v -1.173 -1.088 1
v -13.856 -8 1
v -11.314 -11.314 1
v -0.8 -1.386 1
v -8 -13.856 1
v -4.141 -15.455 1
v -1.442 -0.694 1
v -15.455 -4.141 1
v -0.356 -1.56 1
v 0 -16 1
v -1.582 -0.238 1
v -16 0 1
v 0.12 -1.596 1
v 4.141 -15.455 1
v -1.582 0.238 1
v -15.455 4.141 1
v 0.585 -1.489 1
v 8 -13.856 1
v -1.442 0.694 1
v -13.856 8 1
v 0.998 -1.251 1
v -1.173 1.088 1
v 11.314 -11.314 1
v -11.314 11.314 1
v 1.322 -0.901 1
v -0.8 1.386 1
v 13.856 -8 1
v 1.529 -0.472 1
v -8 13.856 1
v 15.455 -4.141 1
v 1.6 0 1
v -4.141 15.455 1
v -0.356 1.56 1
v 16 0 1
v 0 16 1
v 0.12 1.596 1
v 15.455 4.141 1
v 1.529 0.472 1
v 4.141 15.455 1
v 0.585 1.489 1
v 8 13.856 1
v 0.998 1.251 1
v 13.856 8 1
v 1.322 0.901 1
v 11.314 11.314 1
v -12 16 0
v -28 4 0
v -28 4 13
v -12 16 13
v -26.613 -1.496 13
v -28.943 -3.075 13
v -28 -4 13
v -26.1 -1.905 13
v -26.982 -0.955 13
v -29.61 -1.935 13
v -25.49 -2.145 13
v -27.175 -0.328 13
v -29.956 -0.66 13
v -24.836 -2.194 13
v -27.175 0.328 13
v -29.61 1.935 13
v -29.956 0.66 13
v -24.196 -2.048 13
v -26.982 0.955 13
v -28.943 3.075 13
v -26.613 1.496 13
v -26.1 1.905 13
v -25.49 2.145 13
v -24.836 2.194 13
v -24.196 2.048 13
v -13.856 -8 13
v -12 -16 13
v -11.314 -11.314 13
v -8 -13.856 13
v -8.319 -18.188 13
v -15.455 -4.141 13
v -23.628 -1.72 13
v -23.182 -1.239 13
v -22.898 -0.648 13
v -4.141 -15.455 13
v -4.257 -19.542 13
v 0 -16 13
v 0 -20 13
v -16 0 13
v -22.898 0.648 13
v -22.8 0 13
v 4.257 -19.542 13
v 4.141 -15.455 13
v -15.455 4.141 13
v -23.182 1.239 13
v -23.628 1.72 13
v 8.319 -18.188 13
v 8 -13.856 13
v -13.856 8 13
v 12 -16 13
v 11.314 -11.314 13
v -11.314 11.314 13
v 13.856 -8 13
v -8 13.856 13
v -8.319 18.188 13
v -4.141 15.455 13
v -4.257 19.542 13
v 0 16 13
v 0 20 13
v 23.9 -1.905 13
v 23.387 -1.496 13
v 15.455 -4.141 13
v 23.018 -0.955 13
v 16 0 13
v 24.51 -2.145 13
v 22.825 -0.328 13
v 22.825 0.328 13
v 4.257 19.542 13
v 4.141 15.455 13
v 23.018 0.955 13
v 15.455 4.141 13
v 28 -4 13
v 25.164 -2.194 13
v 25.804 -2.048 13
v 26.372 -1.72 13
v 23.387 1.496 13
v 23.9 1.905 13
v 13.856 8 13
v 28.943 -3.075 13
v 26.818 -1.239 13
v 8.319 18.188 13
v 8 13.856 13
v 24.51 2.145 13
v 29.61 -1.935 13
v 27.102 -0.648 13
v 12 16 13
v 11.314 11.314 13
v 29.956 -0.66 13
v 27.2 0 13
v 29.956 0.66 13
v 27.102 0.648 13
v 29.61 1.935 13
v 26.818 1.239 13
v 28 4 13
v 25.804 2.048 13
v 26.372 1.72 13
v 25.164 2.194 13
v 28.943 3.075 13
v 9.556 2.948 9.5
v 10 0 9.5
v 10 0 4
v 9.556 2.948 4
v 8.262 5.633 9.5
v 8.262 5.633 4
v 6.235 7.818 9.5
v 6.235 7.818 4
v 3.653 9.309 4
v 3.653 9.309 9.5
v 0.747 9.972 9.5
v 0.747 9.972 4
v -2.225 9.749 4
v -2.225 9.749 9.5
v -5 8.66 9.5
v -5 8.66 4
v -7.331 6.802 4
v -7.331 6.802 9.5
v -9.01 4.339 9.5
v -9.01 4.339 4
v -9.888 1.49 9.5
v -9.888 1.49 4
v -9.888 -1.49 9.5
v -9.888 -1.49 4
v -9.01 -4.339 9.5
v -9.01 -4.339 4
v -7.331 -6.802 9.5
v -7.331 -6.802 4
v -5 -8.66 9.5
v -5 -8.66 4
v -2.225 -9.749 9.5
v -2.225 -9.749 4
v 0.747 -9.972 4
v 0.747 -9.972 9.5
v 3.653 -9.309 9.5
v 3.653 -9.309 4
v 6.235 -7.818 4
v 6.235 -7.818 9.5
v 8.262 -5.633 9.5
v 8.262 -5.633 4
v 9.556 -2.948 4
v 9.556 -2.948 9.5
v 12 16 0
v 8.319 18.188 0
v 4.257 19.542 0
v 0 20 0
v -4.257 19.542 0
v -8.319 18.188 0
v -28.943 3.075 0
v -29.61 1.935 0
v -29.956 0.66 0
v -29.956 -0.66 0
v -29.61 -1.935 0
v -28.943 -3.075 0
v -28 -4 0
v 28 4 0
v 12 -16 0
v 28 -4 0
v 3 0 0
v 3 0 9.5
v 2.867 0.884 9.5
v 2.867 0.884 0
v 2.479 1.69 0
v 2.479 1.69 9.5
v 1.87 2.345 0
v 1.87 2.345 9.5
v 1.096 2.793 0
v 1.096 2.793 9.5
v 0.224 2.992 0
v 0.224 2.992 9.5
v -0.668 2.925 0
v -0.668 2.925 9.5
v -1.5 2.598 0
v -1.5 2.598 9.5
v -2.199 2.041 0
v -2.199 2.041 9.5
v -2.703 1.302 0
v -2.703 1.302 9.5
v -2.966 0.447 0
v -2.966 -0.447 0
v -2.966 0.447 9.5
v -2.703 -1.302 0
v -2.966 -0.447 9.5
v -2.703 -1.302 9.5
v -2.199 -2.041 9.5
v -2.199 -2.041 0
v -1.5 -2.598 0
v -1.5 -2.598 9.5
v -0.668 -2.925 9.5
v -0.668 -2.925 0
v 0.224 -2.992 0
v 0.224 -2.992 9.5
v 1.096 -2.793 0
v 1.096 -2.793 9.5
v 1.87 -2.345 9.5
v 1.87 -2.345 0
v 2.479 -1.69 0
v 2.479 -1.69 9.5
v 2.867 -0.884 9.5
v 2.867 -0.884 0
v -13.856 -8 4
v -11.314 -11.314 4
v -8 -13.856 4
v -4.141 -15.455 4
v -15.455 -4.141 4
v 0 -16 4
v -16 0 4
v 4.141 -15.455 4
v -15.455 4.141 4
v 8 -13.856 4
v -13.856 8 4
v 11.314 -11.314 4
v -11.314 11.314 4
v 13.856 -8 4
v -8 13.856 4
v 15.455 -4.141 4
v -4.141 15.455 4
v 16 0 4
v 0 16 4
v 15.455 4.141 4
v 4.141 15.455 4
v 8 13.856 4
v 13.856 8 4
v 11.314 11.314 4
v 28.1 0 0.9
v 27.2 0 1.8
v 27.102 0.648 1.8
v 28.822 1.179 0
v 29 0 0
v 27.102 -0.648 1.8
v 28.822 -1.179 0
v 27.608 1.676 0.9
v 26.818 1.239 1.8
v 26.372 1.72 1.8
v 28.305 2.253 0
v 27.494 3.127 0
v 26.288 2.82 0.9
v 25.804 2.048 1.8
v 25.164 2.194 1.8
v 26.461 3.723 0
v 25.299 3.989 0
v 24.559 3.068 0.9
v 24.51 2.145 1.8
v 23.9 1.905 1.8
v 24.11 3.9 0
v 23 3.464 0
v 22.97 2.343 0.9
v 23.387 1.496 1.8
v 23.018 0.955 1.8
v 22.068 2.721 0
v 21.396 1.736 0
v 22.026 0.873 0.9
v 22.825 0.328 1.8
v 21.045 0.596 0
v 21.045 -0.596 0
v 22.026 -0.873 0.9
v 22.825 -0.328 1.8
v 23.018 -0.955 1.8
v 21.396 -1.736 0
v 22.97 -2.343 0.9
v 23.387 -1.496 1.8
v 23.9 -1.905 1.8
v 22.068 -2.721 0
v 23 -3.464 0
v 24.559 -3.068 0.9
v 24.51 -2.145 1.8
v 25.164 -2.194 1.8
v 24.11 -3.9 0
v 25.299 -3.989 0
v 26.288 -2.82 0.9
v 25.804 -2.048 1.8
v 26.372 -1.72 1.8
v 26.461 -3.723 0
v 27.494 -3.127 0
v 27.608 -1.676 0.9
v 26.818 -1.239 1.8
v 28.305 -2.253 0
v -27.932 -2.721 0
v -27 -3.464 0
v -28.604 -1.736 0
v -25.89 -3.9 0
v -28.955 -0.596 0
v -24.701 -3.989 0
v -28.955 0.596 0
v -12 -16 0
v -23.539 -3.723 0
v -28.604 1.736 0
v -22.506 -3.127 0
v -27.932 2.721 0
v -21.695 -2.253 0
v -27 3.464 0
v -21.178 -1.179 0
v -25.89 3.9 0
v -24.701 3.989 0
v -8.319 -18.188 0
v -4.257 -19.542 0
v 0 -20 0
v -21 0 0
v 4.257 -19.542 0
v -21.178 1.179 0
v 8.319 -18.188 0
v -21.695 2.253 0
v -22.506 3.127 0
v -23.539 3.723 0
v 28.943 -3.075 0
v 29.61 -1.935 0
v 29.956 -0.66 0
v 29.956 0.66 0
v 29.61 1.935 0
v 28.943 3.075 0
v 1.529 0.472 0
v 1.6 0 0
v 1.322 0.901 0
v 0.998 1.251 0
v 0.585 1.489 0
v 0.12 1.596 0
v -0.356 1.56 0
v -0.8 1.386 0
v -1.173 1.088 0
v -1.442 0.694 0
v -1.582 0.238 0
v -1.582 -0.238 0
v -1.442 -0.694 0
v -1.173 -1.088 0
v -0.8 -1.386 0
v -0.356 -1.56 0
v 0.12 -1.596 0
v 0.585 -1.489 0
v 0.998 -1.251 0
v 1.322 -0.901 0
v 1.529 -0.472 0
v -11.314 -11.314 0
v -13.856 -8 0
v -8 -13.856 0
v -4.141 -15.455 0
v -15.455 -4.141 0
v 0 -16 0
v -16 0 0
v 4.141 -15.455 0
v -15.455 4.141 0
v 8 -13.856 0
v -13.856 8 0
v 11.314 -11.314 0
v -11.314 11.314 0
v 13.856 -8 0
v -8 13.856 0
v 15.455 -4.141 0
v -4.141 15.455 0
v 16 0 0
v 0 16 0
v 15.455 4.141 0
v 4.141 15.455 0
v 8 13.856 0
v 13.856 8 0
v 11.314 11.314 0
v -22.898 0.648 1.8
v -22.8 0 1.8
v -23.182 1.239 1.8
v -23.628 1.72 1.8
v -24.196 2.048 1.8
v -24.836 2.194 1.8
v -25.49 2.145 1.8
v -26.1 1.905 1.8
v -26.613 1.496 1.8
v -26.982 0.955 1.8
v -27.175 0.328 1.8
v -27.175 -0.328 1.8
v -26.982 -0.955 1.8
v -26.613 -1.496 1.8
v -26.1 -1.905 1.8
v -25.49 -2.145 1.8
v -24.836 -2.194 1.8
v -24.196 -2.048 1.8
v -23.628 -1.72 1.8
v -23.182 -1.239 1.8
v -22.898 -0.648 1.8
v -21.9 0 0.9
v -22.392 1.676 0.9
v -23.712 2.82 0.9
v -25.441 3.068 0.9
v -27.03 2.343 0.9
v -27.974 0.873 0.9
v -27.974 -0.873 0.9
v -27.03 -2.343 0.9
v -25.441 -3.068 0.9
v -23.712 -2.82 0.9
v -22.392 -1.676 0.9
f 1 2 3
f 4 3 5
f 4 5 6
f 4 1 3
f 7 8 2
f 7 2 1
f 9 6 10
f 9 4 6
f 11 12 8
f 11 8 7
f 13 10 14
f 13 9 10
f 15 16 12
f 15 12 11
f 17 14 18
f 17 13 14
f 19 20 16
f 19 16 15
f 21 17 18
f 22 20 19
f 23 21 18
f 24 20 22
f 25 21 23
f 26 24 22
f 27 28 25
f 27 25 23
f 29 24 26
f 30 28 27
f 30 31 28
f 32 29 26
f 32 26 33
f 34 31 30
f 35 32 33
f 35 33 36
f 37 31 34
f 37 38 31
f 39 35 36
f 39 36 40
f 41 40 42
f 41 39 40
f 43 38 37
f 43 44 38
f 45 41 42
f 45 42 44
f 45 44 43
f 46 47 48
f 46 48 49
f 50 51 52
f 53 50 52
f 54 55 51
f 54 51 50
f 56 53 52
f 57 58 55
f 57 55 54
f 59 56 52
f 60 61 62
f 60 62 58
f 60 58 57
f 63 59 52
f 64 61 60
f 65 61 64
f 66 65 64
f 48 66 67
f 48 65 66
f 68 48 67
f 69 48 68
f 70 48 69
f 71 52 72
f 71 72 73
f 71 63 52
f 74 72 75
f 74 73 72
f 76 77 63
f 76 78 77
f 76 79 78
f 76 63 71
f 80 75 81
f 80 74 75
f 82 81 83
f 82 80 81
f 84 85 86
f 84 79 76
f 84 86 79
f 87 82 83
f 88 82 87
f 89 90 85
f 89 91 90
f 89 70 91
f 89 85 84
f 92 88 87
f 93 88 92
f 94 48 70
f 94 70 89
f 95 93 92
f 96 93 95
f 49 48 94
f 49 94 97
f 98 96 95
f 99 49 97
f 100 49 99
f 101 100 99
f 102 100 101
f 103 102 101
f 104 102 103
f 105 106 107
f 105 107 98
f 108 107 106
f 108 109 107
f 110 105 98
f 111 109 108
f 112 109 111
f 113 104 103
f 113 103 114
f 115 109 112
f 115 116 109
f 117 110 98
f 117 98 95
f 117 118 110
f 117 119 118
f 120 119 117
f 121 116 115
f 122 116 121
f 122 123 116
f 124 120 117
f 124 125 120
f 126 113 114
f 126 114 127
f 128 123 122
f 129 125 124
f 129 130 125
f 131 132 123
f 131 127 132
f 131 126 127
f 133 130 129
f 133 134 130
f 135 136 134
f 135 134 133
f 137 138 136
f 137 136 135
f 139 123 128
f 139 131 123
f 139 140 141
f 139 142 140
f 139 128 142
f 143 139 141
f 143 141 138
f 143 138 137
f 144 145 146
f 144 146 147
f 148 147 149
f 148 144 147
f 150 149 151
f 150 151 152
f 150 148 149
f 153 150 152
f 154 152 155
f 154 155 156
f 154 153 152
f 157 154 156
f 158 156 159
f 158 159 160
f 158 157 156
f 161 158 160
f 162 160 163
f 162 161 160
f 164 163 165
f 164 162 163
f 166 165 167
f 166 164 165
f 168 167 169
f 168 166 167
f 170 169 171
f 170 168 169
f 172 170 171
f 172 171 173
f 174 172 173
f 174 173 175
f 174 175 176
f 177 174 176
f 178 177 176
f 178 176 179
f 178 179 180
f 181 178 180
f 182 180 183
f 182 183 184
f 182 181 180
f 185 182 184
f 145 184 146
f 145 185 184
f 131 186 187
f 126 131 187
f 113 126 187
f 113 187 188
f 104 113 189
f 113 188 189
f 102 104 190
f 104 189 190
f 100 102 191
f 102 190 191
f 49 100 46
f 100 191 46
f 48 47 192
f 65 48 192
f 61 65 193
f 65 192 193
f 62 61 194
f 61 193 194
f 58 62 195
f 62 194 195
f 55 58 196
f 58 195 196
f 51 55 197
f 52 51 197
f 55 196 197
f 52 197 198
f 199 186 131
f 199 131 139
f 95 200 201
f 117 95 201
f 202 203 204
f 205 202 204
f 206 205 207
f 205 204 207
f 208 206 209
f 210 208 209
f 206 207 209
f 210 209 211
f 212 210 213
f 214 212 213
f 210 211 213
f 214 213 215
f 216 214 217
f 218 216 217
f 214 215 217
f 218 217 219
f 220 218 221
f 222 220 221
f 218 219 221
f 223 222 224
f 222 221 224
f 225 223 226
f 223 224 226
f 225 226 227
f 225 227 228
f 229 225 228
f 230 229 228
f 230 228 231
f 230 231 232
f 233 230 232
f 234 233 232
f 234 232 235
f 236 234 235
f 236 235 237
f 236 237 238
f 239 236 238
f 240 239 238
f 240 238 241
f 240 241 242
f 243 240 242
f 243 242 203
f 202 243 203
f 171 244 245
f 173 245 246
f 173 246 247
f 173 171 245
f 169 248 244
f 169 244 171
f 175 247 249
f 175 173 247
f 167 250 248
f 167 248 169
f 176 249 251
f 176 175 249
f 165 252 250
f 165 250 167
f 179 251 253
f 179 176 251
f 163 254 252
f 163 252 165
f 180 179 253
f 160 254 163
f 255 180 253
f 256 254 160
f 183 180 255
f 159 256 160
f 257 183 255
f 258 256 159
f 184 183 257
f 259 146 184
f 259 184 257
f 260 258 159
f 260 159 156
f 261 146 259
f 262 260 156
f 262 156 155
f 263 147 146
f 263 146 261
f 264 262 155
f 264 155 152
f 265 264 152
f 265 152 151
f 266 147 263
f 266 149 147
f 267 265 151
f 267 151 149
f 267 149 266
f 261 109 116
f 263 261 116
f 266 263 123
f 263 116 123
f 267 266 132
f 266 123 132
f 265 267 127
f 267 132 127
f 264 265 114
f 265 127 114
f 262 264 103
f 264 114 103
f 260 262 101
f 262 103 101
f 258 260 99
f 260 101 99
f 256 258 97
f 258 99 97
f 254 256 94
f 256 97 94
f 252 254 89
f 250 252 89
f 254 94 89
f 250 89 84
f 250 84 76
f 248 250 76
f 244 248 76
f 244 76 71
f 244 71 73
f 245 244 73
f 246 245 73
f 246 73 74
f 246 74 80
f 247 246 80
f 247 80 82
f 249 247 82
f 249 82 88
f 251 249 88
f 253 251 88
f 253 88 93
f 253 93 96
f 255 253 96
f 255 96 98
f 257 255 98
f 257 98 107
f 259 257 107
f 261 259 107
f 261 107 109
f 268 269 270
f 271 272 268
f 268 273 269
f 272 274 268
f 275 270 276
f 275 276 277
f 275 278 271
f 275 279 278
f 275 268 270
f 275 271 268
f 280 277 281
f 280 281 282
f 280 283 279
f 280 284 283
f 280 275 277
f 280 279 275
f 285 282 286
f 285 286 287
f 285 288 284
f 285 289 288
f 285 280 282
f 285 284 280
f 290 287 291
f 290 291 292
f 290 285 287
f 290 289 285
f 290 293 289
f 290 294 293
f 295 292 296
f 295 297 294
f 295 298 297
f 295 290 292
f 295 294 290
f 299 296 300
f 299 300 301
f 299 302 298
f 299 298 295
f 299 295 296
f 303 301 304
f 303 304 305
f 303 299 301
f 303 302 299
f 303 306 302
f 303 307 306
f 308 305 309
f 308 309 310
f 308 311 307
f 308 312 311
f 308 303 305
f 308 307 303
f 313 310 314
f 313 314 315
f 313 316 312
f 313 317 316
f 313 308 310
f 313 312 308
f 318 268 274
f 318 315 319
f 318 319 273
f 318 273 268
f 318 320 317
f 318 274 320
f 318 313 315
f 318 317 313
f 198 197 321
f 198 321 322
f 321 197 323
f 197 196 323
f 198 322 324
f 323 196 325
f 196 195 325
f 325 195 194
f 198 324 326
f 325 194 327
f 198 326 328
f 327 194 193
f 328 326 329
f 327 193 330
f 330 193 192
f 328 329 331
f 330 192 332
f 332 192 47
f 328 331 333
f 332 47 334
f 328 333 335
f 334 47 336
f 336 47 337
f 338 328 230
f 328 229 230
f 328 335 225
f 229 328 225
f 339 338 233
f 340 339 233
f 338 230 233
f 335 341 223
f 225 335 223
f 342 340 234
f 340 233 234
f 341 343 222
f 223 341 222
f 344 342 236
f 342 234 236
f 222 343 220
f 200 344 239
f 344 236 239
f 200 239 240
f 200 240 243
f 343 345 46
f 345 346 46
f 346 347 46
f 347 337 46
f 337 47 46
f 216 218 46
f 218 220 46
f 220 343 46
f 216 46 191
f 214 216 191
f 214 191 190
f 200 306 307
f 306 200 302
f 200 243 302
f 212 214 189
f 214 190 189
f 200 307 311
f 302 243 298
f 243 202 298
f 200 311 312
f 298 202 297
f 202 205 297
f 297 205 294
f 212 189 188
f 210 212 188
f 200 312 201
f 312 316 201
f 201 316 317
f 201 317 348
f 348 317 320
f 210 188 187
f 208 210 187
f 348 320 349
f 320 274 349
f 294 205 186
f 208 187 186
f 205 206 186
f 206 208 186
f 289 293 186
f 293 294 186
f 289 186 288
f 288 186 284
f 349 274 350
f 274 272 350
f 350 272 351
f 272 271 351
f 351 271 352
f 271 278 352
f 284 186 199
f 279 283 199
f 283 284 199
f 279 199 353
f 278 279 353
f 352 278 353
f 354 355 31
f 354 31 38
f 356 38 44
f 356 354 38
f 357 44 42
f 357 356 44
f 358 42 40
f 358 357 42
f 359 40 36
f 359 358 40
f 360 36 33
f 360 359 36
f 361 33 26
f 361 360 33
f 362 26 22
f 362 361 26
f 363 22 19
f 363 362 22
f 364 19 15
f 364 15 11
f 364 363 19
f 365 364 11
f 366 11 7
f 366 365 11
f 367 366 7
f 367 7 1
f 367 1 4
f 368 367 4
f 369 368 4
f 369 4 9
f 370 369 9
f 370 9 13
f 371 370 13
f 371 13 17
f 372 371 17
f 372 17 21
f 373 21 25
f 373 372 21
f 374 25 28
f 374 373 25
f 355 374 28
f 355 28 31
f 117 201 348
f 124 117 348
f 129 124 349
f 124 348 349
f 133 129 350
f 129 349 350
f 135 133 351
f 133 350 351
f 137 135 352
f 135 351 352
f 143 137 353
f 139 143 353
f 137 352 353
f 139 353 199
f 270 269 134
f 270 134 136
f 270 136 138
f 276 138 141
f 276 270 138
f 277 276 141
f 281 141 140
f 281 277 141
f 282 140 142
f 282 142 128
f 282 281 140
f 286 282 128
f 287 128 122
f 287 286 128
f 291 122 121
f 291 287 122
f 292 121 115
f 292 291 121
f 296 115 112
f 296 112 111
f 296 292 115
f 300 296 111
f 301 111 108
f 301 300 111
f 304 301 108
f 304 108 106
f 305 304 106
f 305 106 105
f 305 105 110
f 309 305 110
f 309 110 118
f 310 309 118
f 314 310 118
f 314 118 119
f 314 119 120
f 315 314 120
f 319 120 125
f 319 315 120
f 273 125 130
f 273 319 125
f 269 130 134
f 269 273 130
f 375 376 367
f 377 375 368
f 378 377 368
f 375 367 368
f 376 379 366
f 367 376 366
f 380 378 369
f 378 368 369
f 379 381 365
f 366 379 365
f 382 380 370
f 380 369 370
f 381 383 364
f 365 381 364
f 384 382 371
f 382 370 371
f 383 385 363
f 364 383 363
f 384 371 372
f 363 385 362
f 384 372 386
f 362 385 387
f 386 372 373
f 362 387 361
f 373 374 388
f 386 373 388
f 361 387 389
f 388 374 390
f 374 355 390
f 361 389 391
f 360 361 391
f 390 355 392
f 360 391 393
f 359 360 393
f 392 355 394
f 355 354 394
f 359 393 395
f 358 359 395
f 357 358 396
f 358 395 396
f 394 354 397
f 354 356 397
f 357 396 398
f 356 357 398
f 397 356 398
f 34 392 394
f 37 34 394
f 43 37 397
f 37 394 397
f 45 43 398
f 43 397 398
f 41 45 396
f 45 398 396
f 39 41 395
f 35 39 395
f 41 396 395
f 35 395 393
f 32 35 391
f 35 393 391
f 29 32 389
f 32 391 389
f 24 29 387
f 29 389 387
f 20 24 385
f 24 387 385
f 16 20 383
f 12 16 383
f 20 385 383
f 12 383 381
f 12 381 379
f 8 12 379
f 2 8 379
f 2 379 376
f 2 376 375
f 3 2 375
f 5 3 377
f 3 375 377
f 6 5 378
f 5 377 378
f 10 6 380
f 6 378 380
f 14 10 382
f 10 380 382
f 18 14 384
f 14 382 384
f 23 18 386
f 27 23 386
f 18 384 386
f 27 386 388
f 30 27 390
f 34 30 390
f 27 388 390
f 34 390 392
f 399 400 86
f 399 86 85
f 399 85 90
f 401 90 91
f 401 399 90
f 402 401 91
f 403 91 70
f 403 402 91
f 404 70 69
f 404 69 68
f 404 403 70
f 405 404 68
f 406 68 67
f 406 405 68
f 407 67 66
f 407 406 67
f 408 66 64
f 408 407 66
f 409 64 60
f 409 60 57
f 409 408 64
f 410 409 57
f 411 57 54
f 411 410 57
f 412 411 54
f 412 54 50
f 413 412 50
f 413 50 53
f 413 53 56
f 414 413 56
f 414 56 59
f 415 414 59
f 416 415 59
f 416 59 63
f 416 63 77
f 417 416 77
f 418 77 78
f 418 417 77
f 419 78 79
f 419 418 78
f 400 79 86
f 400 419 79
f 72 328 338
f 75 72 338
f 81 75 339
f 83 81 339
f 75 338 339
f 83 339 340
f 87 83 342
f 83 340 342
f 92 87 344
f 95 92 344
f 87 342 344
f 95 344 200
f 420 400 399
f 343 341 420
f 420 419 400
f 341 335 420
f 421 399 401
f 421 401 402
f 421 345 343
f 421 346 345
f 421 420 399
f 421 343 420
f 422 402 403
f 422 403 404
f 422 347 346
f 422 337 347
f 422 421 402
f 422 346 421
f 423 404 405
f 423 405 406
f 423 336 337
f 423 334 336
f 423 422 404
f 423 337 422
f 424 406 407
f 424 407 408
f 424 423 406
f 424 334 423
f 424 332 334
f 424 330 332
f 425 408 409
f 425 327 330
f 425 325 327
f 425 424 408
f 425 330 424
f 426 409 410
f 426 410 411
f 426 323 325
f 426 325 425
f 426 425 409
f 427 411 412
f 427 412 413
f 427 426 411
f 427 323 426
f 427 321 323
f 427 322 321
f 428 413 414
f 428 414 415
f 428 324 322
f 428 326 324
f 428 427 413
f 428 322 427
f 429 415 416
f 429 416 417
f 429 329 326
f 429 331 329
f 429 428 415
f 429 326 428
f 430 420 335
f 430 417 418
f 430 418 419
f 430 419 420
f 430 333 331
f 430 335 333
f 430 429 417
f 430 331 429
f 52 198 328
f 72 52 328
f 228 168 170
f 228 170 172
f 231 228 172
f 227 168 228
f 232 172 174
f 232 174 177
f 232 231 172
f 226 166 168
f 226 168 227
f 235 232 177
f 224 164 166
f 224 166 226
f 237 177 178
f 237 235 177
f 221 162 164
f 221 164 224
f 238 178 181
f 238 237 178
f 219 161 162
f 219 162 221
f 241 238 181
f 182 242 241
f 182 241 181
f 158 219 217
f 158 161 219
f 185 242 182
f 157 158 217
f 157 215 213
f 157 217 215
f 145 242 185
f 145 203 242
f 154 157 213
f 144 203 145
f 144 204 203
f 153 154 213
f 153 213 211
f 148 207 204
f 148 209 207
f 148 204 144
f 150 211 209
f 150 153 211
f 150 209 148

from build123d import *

# Parameters (mm, degrees)
SKETCH_R        = 2.2
PAD_DEPTH       = 13
SKETCH001_R     = 16
POCKET_DEPTH    = 3.5
SKETCH002_R     = 16
SKETCH002_R_2   = 10
POCKET001_DEPTH = 5.5
CHAMFER_SIZE    = 1.8
SKETCH003_R     = 3
POCKET002_DEPTH = 9.501
SKETCH004_R     = 16
SKETCH004_R_2   = 1.6
PAD001_DEPTH    = 1


with BuildPart() as f_5_drillhole_pocket:
    # Sketch → Pad (new body)
    with BuildSketch(Plane.XY):
        with BuildLine():
            ThreePointArc((-28.000001, 4.000003), (-30.000004, 0), (-28.000001, -4.000003))
            Line((-28.000001, -4.000003), (-11.999986, -16.000011))
            ThreePointArc((-11.999986, -16.000011), (1e-06, -20), (11.999988, -16.000009))
            Line((11.999988, -16.000009), (27.999993, -4.000002))
            ThreePointArc((27.999993, -4.000002), (29.999996, 0), (27.999993, 4.000002))
            Line((11.999987, 16.00001), (27.999993, 4.000002))
            ThreePointArc((11.999987, 16.00001), (0, 20), (-11.999987, 16.00001))
            Line((-28.000001, 4.000003), (-11.999987, 16.00001))
        make_face()
        with Locations((-25.000004, 0)):
            Circle(SKETCH_R, mode=Mode.SUBTRACT)
        with Locations((24.999996, 0)):
            Circle(SKETCH_R, mode=Mode.SUBTRACT)
    extrude(amount=PAD_DEPTH)

    # Sketch001 → Pocket (cut)
    with BuildSketch(Plane.XY.offset(13)):
        Circle(SKETCH001_R)
    extrude(amount=-POCKET_DEPTH, mode=Mode.SUBTRACT)

    # Sketch002 → Pocket001 (cut)
    with BuildSketch(Plane.XY.offset(9.5)):
        Circle(SKETCH002_R)
        Circle(SKETCH002_R_2, mode=Mode.SUBTRACT)
    extrude(amount=-POCKET001_DEPTH, mode=Mode.SUBTRACT)

    # Chamfer
    chamfer_edges = [f_5_drillhole_pocket.edges().sort_by_distance(p)[0] for p in [
        (-27.200004, 0, 0),
        (22.799996, 0, 0),
    ]]
    chamfer(chamfer_edges, length=CHAMFER_SIZE)

    # Sketch003 → Pocket002 (cut, through all)
    with BuildSketch(Plane.XY.offset(9.5)):
        Circle(SKETCH003_R)
    extrude(amount=-POCKET002_DEPTH, mode=Mode.SUBTRACT)


with BuildPart() as f_1_feetpadbase_pad:
    # Sketch004 → Pad001 (new body)
    with BuildSketch(Plane.XY):
        Circle(SKETCH004_R)
        Circle(SKETCH004_R_2, mode=Mode.SUBTRACT)
    extrude(amount=PAD001_DEPTH)


solid = Compound([f_5_drillhole_pocket.part, f_1_feetpadbase_pad.part])
